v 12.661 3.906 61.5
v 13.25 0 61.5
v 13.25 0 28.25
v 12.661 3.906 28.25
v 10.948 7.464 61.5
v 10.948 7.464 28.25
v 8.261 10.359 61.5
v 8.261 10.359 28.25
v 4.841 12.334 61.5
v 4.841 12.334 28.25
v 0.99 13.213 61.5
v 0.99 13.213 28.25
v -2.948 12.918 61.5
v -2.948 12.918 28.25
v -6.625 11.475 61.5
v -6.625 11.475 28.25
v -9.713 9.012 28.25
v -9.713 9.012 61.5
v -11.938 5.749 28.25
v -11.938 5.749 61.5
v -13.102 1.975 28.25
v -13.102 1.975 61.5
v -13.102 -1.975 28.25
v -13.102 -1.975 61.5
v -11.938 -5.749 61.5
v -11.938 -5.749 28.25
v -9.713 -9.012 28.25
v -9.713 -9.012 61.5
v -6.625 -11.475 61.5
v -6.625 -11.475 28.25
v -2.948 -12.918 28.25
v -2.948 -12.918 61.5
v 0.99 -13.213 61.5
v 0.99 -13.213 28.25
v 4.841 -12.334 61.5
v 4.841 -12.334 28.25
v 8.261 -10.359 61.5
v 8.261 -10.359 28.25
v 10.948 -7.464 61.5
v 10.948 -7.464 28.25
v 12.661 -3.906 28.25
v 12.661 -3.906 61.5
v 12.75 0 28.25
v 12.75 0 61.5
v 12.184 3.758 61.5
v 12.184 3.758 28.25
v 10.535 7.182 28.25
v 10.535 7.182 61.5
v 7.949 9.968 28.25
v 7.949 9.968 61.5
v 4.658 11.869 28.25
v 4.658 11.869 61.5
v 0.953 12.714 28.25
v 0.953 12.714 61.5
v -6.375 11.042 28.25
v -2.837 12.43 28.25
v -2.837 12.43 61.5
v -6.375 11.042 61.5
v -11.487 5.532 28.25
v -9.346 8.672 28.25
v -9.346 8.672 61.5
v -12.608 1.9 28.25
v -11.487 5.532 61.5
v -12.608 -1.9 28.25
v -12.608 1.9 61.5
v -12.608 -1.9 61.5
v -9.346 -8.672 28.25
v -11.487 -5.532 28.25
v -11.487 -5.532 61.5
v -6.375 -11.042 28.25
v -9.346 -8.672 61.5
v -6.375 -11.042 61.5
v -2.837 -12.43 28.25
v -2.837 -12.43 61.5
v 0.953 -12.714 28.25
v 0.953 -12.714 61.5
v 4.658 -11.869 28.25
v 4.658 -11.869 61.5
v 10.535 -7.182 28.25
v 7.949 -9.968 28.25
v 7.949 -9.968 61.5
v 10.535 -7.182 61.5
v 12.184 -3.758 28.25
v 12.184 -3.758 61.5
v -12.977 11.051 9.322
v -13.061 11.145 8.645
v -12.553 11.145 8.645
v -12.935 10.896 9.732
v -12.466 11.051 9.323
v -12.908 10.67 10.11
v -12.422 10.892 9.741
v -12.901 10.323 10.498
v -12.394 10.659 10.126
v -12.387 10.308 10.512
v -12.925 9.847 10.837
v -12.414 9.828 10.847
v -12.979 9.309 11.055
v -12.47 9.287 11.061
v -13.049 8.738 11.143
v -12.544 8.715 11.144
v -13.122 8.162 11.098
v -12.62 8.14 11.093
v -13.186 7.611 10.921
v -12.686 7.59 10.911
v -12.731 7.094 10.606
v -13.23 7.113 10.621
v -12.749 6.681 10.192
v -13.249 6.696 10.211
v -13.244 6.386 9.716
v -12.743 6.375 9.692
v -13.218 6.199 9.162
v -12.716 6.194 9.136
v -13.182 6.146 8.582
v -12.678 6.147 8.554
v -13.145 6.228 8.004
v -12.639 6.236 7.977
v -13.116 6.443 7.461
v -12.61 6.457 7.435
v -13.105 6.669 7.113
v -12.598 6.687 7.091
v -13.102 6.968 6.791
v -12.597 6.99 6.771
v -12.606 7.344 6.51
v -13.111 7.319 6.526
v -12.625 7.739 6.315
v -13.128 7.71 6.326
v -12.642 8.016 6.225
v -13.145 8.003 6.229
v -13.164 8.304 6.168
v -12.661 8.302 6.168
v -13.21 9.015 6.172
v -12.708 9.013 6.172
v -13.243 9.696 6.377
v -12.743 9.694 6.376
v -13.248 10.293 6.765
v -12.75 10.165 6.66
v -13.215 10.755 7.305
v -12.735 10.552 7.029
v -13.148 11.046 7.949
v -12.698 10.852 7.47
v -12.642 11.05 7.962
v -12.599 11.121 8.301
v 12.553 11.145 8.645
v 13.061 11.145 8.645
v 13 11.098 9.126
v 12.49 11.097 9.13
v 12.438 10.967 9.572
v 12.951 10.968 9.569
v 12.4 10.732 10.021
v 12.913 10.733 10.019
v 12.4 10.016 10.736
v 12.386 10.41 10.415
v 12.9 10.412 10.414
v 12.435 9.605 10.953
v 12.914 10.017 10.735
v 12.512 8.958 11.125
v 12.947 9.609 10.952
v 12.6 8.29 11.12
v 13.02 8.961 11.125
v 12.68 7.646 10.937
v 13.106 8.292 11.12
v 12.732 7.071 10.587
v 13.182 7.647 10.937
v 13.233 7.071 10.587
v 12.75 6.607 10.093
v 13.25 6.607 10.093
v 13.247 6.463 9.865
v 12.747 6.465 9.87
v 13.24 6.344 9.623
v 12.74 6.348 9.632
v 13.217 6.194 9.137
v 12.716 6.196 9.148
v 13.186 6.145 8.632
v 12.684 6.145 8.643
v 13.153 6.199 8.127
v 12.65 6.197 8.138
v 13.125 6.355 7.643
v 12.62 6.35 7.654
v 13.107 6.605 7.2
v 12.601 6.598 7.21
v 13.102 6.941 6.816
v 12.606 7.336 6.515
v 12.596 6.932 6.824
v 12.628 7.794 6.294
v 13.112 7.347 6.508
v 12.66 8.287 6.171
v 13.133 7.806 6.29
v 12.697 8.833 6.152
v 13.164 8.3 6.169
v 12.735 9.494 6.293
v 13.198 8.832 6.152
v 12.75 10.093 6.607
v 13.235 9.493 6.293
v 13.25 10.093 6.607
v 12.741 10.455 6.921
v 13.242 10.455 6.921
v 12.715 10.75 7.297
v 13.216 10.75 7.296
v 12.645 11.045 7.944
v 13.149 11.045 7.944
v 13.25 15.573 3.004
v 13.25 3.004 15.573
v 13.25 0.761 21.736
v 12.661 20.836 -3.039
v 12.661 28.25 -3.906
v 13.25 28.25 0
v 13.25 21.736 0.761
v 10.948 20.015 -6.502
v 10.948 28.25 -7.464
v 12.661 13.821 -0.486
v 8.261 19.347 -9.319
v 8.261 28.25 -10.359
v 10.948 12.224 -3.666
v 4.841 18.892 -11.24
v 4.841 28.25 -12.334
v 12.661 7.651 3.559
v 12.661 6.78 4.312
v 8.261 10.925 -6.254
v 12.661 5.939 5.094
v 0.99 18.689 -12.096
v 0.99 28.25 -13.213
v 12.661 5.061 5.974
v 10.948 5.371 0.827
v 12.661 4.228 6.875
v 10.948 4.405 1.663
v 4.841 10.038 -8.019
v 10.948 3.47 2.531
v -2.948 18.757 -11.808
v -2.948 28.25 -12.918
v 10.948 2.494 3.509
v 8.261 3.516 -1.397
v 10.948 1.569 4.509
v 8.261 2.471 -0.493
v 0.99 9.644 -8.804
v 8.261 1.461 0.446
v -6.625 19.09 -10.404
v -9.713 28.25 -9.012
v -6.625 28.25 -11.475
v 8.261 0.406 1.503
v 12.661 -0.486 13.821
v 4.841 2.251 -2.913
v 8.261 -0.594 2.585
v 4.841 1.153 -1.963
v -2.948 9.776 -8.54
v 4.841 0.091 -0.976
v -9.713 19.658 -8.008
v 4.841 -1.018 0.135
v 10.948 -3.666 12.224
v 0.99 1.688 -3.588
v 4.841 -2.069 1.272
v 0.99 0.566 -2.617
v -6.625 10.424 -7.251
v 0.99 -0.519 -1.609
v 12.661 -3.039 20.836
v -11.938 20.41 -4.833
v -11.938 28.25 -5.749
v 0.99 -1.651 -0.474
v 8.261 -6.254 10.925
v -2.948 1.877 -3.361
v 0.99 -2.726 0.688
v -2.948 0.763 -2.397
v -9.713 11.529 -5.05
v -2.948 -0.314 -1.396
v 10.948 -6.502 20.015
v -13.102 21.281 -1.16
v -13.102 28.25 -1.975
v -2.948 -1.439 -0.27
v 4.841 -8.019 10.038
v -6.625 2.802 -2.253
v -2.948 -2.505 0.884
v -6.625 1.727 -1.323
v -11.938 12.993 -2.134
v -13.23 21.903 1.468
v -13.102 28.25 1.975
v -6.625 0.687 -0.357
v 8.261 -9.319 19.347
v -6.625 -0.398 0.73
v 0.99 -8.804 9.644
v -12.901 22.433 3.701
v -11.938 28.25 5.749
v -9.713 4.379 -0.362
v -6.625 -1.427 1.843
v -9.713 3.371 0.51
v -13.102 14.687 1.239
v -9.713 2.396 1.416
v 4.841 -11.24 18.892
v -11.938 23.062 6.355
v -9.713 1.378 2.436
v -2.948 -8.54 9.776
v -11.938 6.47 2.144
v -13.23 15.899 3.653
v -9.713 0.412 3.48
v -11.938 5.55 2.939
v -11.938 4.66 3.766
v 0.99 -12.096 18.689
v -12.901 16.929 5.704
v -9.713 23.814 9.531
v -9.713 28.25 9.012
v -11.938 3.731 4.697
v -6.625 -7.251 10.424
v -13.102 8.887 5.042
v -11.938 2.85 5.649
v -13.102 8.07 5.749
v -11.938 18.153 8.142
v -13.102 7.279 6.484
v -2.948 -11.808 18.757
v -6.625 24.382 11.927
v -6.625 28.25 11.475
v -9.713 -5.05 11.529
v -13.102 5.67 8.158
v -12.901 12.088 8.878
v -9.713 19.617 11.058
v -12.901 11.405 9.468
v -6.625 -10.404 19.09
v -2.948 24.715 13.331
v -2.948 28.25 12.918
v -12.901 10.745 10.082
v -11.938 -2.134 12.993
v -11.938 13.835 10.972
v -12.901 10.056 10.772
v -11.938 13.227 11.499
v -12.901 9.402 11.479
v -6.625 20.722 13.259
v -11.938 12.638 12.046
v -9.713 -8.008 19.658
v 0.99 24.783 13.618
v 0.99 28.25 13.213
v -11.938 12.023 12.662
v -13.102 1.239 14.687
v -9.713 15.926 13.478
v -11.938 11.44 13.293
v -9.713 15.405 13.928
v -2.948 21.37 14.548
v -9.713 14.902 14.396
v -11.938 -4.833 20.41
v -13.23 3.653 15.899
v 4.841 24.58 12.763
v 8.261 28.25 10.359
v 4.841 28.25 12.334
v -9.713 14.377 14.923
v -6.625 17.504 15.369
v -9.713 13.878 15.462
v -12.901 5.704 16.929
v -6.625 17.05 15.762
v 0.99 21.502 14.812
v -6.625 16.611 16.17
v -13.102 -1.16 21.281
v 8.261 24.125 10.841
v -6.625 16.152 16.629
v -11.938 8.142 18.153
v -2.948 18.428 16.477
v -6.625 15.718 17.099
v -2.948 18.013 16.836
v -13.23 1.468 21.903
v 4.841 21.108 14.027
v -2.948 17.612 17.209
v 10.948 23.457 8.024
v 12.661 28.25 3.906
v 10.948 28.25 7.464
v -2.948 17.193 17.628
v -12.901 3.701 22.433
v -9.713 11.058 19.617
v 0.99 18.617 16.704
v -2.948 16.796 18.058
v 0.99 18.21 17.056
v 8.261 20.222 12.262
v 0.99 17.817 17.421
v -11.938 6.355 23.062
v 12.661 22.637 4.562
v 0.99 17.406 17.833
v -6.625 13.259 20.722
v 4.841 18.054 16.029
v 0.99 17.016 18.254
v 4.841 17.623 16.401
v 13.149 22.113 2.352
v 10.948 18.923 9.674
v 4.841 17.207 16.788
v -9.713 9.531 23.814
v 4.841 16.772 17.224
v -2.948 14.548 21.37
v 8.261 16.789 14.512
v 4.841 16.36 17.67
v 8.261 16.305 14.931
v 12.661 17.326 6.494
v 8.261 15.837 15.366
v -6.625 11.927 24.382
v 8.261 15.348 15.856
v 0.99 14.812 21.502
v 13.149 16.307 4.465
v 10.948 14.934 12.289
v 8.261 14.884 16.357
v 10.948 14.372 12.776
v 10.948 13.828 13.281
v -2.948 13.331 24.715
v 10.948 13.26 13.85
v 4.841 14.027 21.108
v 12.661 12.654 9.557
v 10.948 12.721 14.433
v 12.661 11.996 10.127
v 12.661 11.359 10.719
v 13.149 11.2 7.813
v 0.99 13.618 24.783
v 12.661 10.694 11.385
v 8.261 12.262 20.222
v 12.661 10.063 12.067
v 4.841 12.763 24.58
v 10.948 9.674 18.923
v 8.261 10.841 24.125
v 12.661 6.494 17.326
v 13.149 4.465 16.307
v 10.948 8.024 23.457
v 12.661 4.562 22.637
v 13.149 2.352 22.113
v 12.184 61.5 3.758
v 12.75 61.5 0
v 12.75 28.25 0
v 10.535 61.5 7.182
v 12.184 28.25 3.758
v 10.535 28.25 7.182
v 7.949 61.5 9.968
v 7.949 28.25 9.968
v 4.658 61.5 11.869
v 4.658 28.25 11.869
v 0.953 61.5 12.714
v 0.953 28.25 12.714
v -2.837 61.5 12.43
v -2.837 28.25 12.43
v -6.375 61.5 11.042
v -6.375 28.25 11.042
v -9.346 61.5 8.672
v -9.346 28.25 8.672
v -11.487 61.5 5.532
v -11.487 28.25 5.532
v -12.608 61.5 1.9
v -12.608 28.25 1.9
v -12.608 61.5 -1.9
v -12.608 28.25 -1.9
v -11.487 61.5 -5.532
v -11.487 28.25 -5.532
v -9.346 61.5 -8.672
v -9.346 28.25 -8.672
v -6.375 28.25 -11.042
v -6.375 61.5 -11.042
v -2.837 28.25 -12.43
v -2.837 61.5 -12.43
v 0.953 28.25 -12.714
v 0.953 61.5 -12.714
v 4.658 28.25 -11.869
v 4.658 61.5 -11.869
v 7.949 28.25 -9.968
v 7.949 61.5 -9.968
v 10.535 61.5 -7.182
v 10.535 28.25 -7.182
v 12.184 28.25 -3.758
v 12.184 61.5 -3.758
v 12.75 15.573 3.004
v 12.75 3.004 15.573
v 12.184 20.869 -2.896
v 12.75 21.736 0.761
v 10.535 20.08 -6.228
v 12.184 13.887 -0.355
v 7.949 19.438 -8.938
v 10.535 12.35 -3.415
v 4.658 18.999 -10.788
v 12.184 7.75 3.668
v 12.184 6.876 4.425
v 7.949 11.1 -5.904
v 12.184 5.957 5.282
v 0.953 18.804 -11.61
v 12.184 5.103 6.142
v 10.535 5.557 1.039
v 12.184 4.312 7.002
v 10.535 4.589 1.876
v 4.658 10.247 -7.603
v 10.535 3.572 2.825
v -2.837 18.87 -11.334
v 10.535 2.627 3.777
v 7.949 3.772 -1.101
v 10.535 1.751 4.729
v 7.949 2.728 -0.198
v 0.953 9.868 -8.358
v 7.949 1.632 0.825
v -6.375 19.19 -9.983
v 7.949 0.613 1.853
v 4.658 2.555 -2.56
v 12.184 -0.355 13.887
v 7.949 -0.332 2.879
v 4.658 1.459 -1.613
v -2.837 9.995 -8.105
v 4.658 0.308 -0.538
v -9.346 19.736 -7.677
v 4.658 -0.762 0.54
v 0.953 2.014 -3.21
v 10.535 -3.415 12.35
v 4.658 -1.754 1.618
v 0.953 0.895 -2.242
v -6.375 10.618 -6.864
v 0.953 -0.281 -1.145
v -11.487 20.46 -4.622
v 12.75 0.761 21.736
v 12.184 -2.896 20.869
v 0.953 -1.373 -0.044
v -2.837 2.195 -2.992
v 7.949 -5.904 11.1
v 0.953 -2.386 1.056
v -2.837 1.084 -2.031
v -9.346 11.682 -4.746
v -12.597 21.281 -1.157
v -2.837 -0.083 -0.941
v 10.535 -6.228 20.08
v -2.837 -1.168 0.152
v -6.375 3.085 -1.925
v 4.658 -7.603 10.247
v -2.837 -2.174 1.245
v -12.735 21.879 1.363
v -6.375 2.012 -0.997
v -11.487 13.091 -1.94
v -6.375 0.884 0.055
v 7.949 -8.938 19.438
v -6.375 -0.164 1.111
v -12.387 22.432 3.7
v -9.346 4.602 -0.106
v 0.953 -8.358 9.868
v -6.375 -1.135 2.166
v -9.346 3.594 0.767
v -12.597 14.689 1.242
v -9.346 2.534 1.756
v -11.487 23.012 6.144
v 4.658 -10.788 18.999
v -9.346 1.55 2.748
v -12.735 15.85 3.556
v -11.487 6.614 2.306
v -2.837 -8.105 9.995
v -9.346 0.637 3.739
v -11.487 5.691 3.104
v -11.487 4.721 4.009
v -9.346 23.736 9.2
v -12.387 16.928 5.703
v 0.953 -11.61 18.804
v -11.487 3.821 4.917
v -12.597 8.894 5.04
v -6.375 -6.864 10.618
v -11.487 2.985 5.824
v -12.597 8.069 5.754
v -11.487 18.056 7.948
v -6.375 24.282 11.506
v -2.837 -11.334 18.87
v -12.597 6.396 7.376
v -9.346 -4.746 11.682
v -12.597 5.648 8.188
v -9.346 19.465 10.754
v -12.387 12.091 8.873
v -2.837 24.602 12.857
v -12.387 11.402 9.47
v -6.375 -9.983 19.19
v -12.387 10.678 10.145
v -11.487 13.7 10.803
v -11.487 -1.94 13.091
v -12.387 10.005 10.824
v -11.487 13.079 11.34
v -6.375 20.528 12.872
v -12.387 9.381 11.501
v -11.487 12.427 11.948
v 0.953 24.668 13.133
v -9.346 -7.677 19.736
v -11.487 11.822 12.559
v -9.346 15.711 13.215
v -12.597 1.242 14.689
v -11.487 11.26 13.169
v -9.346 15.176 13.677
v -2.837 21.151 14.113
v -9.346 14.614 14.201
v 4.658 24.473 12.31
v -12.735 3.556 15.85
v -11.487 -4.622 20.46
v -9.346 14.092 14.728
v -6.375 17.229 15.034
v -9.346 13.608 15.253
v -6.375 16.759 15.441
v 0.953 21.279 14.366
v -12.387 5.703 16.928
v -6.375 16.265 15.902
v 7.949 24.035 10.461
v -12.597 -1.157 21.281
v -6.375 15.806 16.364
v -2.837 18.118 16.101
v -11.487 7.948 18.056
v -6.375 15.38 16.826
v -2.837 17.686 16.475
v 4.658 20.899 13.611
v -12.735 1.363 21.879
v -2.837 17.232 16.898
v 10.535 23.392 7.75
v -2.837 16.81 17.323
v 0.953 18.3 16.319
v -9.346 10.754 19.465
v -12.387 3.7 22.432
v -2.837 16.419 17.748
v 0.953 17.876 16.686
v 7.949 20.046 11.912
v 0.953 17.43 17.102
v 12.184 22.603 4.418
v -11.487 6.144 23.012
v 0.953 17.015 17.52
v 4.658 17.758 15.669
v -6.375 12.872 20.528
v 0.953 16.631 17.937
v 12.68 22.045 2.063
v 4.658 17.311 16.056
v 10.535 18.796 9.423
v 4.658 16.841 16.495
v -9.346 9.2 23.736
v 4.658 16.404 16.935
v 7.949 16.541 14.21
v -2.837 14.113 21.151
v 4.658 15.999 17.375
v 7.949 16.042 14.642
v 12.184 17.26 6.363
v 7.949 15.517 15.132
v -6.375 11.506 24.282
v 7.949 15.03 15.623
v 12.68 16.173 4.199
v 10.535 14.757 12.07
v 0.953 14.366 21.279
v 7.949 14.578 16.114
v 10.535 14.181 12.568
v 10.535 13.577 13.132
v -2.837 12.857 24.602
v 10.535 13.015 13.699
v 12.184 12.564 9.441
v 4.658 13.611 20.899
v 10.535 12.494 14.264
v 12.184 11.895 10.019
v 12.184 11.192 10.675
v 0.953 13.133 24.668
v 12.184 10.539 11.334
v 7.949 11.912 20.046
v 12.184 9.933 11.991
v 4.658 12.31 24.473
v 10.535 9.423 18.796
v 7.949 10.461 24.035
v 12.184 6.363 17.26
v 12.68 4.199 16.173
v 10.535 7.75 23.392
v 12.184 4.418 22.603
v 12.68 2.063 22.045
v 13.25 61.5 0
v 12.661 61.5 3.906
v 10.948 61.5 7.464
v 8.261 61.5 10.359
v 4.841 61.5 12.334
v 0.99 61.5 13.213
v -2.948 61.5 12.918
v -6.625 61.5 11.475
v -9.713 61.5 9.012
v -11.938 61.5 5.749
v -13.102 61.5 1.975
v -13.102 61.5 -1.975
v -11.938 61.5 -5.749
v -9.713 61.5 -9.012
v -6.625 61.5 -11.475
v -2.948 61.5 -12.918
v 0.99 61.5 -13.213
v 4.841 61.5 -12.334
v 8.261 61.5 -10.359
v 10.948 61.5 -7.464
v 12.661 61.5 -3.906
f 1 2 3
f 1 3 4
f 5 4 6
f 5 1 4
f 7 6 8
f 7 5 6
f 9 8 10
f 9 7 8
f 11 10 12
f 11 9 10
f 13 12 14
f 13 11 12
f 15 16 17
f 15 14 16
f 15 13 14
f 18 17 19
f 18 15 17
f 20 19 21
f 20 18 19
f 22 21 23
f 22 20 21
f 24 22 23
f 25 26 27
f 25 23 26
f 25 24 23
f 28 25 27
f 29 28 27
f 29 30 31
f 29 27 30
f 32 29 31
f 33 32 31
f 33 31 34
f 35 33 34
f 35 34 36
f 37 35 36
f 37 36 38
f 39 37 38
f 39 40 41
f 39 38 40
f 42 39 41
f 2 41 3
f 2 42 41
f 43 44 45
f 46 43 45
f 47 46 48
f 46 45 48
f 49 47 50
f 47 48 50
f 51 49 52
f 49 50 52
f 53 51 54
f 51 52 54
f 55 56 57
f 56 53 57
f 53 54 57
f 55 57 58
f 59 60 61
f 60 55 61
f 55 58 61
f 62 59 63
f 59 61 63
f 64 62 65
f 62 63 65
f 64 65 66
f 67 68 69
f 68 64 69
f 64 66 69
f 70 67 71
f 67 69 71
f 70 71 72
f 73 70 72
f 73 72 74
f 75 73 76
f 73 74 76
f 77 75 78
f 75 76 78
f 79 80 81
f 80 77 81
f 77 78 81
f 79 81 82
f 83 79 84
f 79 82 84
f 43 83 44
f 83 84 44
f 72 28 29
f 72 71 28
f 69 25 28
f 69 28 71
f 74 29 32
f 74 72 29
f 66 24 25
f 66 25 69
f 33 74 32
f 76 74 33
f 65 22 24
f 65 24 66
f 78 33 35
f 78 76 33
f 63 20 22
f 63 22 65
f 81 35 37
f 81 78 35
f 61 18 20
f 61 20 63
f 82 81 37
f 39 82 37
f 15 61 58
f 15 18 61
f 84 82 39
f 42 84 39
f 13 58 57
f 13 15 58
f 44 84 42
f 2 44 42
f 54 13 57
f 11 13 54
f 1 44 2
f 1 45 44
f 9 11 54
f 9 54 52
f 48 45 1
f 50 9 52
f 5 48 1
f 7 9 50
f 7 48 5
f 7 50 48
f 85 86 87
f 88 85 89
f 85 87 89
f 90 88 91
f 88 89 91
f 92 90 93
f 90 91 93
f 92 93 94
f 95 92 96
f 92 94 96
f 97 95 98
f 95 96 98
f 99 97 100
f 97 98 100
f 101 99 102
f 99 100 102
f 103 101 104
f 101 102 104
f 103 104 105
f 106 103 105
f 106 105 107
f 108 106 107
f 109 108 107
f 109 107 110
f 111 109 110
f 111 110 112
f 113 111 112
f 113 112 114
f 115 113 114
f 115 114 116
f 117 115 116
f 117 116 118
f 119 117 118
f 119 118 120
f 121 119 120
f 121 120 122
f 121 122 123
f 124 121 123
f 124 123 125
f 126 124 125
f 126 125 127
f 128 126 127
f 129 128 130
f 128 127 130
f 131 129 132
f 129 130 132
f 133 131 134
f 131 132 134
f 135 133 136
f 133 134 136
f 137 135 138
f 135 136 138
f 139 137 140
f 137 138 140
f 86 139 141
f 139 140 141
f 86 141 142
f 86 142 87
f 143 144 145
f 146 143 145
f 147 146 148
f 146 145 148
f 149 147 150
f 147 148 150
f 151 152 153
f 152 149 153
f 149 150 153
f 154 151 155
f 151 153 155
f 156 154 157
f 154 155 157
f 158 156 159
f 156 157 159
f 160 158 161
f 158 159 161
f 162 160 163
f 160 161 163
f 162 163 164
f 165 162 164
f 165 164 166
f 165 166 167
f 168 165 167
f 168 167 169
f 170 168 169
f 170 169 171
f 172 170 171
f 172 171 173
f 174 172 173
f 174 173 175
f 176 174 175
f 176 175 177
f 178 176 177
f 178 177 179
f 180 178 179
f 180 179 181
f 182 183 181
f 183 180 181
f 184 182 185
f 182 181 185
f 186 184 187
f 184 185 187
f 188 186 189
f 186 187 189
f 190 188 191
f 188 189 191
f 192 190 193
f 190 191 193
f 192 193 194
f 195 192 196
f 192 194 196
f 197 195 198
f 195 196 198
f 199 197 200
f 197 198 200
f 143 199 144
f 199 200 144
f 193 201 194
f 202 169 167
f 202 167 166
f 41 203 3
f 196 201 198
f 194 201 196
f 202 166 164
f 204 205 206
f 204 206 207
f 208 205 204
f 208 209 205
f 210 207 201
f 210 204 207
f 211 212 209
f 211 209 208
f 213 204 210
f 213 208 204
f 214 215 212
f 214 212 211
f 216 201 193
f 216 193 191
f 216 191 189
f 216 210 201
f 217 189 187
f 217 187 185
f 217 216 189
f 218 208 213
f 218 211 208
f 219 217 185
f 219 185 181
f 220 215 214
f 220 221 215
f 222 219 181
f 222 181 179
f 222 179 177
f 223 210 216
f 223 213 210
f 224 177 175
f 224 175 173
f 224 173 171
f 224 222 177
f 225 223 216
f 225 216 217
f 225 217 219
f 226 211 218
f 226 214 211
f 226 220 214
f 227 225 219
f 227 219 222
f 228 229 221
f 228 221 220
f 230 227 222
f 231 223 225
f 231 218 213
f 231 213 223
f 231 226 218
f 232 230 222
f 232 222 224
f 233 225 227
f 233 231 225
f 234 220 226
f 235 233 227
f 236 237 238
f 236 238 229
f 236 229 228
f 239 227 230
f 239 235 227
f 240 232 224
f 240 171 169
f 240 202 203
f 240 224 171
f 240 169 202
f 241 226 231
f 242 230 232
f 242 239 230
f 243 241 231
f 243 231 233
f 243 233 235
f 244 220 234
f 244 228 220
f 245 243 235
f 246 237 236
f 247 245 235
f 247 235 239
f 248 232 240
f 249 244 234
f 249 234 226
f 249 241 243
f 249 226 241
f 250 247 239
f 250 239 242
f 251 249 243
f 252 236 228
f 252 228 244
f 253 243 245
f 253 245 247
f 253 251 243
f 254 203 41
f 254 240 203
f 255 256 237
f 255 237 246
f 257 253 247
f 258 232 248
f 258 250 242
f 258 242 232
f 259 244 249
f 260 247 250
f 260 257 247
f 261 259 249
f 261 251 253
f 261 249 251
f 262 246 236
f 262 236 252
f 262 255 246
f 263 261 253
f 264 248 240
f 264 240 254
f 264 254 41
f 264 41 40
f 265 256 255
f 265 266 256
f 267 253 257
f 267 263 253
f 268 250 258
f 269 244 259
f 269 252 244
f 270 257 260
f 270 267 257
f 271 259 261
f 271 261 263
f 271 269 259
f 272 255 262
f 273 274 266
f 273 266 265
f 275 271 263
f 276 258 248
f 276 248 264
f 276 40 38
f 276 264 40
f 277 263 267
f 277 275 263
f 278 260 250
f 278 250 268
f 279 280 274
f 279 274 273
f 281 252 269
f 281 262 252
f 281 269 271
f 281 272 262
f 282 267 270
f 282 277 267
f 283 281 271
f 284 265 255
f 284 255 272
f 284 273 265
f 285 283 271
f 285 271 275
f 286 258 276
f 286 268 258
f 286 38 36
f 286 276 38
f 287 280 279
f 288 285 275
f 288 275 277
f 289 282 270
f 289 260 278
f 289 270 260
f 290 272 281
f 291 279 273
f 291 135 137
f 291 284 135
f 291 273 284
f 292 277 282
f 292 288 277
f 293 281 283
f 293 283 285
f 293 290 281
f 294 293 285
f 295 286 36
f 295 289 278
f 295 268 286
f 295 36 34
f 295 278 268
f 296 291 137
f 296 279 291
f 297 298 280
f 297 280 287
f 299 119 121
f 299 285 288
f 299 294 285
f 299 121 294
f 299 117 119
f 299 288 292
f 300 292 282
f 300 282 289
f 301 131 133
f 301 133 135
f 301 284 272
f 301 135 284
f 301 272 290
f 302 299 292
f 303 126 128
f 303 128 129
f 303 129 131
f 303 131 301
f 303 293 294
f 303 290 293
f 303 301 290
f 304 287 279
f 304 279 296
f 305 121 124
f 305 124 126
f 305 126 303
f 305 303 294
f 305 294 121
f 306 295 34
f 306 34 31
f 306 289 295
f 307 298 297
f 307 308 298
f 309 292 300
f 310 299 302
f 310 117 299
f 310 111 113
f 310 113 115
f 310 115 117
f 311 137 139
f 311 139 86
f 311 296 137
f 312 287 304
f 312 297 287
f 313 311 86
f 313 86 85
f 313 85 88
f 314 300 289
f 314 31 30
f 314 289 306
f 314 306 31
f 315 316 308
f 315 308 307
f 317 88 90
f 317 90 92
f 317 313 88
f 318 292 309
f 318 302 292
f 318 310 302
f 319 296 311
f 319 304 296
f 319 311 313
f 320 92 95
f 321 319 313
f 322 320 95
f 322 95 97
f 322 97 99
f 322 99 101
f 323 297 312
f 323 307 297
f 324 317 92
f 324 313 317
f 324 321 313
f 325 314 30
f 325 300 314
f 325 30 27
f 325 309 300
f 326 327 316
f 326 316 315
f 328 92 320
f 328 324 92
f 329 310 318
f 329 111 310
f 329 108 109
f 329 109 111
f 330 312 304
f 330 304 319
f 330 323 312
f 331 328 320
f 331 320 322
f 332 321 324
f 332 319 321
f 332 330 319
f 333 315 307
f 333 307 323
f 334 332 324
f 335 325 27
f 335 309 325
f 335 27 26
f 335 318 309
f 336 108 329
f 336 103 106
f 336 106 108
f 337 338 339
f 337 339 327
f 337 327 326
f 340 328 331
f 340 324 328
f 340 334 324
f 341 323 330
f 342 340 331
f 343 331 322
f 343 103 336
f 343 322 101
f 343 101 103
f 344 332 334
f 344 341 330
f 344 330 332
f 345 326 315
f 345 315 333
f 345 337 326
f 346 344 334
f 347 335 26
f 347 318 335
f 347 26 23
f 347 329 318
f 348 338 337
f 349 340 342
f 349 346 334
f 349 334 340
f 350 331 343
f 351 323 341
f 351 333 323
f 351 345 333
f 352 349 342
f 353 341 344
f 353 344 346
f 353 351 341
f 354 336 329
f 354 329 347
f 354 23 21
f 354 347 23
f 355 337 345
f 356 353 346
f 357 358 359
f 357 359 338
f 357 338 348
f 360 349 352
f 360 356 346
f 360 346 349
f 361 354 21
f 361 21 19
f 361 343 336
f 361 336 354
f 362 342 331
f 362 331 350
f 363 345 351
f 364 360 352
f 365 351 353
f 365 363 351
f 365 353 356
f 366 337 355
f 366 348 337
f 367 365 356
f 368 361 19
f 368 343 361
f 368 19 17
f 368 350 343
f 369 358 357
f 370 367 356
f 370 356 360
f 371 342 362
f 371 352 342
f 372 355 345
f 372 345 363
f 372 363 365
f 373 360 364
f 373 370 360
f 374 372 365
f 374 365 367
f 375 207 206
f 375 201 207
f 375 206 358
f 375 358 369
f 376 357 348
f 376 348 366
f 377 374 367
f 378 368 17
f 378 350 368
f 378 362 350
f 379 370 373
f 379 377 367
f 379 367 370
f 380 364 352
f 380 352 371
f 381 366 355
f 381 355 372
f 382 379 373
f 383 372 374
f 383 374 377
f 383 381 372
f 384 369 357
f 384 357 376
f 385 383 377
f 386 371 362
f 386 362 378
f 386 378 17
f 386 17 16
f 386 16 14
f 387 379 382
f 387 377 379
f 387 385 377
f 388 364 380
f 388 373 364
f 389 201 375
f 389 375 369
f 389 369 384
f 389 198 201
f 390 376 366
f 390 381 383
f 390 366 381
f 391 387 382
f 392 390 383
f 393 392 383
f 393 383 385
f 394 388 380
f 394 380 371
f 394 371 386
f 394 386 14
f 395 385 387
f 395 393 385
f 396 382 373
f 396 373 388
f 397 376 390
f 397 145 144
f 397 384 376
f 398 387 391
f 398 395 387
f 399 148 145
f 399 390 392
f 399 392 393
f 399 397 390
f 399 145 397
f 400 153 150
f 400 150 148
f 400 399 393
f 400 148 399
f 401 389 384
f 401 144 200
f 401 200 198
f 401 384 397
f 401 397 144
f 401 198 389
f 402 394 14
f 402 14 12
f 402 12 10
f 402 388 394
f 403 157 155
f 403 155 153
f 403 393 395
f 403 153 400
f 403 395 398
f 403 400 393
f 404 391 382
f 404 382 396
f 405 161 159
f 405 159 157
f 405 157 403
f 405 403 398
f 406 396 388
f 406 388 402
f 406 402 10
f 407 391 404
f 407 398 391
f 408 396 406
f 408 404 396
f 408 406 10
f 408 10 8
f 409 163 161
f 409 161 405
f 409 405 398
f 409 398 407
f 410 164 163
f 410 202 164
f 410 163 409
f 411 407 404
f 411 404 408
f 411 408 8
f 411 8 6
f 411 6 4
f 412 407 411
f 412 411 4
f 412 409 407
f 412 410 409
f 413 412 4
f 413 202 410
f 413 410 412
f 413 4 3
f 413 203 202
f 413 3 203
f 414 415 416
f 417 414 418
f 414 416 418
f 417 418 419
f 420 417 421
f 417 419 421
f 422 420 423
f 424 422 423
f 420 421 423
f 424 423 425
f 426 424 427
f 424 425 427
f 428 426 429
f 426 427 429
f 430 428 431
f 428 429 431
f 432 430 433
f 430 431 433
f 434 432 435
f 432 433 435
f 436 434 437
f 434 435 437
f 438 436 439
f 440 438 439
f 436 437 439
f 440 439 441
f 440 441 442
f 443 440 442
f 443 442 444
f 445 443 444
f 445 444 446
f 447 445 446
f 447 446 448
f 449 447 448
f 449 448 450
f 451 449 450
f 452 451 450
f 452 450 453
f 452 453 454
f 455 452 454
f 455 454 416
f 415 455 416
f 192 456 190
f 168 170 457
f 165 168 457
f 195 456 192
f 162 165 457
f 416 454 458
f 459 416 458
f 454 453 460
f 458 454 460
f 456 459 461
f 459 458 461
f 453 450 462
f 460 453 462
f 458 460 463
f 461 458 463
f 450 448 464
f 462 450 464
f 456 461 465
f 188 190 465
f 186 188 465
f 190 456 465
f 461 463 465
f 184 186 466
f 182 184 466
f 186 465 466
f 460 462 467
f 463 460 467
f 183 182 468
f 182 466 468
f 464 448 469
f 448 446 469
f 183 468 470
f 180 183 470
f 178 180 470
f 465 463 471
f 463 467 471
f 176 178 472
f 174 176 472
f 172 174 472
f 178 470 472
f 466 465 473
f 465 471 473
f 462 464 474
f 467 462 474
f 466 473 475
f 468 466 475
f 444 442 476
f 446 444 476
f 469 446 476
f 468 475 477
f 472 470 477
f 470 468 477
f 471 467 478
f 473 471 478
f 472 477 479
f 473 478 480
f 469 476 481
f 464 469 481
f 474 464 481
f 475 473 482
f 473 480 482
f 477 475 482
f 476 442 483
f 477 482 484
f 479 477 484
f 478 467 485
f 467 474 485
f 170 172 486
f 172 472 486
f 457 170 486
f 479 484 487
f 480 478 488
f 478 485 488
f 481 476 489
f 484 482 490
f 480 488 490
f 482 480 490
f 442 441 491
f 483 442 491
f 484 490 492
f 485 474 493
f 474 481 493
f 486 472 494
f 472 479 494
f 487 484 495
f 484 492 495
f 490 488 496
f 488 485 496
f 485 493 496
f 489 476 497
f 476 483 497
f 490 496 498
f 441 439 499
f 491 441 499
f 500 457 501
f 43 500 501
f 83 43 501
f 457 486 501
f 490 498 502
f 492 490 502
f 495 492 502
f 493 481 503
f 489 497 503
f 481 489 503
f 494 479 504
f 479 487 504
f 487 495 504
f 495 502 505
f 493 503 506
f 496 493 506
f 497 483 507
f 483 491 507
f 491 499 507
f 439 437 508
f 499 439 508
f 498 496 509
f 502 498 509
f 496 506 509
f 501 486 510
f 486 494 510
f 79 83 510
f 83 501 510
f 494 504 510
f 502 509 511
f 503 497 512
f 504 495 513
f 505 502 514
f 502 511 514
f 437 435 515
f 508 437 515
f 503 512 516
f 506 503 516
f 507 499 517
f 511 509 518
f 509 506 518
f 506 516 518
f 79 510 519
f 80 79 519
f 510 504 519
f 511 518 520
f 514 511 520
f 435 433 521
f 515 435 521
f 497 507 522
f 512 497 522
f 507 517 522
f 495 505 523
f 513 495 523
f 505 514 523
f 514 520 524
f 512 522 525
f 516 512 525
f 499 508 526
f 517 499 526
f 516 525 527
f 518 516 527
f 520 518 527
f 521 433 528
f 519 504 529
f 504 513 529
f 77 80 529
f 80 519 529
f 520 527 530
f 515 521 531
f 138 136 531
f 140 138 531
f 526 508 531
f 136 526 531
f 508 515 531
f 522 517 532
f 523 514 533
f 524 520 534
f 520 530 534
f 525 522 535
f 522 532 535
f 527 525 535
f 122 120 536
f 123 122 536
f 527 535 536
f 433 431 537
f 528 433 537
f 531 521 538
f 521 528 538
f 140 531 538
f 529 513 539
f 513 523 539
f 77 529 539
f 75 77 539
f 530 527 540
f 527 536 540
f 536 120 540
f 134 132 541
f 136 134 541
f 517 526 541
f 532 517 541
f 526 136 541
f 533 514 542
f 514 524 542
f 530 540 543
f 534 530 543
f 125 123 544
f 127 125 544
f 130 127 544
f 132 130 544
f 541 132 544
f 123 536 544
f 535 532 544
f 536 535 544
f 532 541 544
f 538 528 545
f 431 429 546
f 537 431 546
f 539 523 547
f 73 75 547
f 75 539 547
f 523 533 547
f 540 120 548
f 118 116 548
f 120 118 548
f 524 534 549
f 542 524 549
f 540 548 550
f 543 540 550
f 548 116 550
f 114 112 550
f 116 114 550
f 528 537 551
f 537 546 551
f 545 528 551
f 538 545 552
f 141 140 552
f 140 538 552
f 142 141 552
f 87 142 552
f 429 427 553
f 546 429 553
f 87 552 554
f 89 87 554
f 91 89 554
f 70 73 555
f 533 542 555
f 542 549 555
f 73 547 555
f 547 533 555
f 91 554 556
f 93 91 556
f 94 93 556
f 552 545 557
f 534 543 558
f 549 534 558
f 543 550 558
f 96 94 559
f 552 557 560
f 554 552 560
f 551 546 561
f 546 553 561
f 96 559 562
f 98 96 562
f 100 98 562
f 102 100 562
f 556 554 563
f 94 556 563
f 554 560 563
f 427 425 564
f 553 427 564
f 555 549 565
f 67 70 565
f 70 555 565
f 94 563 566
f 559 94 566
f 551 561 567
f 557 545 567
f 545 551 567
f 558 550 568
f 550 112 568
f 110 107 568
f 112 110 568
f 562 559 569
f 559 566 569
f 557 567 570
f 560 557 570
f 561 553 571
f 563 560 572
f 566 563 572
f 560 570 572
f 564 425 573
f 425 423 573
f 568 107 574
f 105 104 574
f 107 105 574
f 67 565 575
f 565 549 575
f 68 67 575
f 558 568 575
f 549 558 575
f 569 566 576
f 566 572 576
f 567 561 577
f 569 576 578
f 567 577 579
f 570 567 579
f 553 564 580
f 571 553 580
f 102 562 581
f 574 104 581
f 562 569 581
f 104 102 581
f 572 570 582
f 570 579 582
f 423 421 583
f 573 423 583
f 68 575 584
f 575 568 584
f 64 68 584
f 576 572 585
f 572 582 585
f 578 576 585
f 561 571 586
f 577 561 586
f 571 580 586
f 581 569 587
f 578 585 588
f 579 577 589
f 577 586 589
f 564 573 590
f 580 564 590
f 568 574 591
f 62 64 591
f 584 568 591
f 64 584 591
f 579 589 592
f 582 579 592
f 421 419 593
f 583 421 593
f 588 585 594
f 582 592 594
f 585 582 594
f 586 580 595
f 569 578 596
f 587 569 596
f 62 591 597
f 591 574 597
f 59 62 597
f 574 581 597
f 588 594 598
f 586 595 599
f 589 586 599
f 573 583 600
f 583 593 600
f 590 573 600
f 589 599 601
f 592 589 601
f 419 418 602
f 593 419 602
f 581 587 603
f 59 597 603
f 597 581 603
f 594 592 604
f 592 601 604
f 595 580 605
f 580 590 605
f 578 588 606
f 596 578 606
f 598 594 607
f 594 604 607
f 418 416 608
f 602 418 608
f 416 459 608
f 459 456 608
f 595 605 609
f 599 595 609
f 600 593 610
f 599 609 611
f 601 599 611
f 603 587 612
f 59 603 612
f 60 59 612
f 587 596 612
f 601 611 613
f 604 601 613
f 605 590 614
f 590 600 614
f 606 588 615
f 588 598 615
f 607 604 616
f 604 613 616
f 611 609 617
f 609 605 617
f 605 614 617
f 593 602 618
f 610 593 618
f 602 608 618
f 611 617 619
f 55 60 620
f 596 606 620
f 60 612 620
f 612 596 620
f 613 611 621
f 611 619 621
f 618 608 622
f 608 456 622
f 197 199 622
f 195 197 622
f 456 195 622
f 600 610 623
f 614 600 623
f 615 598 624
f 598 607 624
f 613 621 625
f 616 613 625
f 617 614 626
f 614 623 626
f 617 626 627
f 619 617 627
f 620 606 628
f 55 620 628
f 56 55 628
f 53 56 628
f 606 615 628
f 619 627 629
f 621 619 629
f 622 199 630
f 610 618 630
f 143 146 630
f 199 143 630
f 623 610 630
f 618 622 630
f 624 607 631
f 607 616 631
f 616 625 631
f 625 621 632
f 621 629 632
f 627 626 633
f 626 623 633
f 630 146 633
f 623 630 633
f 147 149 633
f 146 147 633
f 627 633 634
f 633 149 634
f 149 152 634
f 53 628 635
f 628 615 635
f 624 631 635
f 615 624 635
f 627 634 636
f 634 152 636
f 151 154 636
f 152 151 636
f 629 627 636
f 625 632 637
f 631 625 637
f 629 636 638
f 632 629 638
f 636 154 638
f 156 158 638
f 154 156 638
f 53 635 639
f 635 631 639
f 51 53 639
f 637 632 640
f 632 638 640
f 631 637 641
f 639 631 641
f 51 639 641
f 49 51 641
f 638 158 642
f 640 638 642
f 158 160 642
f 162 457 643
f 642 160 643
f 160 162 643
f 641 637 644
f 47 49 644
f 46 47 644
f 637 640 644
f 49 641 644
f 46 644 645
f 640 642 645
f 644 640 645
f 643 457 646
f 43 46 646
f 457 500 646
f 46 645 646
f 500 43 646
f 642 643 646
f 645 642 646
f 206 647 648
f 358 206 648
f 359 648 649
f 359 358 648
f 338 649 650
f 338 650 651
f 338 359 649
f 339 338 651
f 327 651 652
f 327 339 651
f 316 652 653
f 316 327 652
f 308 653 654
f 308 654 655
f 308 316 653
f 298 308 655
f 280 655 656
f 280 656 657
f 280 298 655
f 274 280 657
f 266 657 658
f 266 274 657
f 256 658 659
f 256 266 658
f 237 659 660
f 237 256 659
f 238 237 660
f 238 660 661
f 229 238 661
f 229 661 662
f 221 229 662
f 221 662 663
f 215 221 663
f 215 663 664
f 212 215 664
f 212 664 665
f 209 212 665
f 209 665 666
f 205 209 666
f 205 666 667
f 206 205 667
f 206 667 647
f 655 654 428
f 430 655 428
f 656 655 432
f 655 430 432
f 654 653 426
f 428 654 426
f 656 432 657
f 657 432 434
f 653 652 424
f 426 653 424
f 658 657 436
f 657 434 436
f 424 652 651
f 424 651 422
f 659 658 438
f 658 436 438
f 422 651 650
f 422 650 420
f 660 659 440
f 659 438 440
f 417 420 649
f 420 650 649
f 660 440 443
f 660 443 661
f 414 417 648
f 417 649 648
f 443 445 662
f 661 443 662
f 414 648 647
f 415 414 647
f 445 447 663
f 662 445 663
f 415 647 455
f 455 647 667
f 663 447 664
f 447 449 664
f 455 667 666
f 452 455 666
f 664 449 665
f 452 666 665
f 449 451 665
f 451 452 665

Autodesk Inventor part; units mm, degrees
ref_plane "Work Plane1" through (0, 0, 61.5) normal (0, 0, 1) x (1, 0, 0)
sketch "Sketch1" plane through (0, 0, 61.5) normal (0, 0, 1) x (1, 0, 0)
  circle A0 centre (0, 0) radius 13.25
  dimension "d1" = 26.5
ref_plane "Work Plane2" through (0, 61.5, 0) normal (0, 1, 0) x (-1, 0, 0)
sketch "Sketch2" plane through (0, 61.5, 0) normal (0, 1, 0) x (-1, 0, 0)
  circle A0 centre (0, 0) radius 13.25
  dimension "d3" = 26.5
sketch "Sketch3" plane through (0, 0, 0) normal (1, 0, 0) x (0, 1, 0)
  line L0 (13.25, 61.5) -> (-13.25, 61.5) construction
  line L1 (61.5, -13.25) -> (61.5, 13.25) construction
  line L2 (0, -28.2) -> (0, 76.45) construction
  line L3 (-28.2, 0) -> (76.45, 0) construction
  line L4 (0, 0) -> (0, 61.5)
  line L5 (0, 0) -> (61.5, 0)
  line L6 (61.5, 13.25) -> (28.25, 13.25)
  line L7 (13.25, 28.25) -> (13.25, 61.5)
  arc A0 (13.25, 28.25) -> (28.25, 13.25) centre (28.25, 28.25) ccw
  dimension "d4" = 15
sweep "Sweep1" add profiles "Sketch1" path "Sketch3" path curves L7 A0 L6
shell "Shell1" thickness 0.5 removed faces 2 at (0.1548, 61.5, -7.494) at (-0.404, -5.4414, 61.5)
ref_plane "Work Plane3" through (26.75, 0, 0) normal (1, 0, 0) x (0, 1, 0)
sketch "Sketch4" plane through (26.75, 0, 0) normal (1, 0, 0) x (0, 1, 0)
  circle A0 centre (8.6449, 8.6449) radius 2.5
  point P0 (0, 0)
extrude "Extrusion1" cut sketch "Sketch4" against normal through all
properties part number "knee 90"
